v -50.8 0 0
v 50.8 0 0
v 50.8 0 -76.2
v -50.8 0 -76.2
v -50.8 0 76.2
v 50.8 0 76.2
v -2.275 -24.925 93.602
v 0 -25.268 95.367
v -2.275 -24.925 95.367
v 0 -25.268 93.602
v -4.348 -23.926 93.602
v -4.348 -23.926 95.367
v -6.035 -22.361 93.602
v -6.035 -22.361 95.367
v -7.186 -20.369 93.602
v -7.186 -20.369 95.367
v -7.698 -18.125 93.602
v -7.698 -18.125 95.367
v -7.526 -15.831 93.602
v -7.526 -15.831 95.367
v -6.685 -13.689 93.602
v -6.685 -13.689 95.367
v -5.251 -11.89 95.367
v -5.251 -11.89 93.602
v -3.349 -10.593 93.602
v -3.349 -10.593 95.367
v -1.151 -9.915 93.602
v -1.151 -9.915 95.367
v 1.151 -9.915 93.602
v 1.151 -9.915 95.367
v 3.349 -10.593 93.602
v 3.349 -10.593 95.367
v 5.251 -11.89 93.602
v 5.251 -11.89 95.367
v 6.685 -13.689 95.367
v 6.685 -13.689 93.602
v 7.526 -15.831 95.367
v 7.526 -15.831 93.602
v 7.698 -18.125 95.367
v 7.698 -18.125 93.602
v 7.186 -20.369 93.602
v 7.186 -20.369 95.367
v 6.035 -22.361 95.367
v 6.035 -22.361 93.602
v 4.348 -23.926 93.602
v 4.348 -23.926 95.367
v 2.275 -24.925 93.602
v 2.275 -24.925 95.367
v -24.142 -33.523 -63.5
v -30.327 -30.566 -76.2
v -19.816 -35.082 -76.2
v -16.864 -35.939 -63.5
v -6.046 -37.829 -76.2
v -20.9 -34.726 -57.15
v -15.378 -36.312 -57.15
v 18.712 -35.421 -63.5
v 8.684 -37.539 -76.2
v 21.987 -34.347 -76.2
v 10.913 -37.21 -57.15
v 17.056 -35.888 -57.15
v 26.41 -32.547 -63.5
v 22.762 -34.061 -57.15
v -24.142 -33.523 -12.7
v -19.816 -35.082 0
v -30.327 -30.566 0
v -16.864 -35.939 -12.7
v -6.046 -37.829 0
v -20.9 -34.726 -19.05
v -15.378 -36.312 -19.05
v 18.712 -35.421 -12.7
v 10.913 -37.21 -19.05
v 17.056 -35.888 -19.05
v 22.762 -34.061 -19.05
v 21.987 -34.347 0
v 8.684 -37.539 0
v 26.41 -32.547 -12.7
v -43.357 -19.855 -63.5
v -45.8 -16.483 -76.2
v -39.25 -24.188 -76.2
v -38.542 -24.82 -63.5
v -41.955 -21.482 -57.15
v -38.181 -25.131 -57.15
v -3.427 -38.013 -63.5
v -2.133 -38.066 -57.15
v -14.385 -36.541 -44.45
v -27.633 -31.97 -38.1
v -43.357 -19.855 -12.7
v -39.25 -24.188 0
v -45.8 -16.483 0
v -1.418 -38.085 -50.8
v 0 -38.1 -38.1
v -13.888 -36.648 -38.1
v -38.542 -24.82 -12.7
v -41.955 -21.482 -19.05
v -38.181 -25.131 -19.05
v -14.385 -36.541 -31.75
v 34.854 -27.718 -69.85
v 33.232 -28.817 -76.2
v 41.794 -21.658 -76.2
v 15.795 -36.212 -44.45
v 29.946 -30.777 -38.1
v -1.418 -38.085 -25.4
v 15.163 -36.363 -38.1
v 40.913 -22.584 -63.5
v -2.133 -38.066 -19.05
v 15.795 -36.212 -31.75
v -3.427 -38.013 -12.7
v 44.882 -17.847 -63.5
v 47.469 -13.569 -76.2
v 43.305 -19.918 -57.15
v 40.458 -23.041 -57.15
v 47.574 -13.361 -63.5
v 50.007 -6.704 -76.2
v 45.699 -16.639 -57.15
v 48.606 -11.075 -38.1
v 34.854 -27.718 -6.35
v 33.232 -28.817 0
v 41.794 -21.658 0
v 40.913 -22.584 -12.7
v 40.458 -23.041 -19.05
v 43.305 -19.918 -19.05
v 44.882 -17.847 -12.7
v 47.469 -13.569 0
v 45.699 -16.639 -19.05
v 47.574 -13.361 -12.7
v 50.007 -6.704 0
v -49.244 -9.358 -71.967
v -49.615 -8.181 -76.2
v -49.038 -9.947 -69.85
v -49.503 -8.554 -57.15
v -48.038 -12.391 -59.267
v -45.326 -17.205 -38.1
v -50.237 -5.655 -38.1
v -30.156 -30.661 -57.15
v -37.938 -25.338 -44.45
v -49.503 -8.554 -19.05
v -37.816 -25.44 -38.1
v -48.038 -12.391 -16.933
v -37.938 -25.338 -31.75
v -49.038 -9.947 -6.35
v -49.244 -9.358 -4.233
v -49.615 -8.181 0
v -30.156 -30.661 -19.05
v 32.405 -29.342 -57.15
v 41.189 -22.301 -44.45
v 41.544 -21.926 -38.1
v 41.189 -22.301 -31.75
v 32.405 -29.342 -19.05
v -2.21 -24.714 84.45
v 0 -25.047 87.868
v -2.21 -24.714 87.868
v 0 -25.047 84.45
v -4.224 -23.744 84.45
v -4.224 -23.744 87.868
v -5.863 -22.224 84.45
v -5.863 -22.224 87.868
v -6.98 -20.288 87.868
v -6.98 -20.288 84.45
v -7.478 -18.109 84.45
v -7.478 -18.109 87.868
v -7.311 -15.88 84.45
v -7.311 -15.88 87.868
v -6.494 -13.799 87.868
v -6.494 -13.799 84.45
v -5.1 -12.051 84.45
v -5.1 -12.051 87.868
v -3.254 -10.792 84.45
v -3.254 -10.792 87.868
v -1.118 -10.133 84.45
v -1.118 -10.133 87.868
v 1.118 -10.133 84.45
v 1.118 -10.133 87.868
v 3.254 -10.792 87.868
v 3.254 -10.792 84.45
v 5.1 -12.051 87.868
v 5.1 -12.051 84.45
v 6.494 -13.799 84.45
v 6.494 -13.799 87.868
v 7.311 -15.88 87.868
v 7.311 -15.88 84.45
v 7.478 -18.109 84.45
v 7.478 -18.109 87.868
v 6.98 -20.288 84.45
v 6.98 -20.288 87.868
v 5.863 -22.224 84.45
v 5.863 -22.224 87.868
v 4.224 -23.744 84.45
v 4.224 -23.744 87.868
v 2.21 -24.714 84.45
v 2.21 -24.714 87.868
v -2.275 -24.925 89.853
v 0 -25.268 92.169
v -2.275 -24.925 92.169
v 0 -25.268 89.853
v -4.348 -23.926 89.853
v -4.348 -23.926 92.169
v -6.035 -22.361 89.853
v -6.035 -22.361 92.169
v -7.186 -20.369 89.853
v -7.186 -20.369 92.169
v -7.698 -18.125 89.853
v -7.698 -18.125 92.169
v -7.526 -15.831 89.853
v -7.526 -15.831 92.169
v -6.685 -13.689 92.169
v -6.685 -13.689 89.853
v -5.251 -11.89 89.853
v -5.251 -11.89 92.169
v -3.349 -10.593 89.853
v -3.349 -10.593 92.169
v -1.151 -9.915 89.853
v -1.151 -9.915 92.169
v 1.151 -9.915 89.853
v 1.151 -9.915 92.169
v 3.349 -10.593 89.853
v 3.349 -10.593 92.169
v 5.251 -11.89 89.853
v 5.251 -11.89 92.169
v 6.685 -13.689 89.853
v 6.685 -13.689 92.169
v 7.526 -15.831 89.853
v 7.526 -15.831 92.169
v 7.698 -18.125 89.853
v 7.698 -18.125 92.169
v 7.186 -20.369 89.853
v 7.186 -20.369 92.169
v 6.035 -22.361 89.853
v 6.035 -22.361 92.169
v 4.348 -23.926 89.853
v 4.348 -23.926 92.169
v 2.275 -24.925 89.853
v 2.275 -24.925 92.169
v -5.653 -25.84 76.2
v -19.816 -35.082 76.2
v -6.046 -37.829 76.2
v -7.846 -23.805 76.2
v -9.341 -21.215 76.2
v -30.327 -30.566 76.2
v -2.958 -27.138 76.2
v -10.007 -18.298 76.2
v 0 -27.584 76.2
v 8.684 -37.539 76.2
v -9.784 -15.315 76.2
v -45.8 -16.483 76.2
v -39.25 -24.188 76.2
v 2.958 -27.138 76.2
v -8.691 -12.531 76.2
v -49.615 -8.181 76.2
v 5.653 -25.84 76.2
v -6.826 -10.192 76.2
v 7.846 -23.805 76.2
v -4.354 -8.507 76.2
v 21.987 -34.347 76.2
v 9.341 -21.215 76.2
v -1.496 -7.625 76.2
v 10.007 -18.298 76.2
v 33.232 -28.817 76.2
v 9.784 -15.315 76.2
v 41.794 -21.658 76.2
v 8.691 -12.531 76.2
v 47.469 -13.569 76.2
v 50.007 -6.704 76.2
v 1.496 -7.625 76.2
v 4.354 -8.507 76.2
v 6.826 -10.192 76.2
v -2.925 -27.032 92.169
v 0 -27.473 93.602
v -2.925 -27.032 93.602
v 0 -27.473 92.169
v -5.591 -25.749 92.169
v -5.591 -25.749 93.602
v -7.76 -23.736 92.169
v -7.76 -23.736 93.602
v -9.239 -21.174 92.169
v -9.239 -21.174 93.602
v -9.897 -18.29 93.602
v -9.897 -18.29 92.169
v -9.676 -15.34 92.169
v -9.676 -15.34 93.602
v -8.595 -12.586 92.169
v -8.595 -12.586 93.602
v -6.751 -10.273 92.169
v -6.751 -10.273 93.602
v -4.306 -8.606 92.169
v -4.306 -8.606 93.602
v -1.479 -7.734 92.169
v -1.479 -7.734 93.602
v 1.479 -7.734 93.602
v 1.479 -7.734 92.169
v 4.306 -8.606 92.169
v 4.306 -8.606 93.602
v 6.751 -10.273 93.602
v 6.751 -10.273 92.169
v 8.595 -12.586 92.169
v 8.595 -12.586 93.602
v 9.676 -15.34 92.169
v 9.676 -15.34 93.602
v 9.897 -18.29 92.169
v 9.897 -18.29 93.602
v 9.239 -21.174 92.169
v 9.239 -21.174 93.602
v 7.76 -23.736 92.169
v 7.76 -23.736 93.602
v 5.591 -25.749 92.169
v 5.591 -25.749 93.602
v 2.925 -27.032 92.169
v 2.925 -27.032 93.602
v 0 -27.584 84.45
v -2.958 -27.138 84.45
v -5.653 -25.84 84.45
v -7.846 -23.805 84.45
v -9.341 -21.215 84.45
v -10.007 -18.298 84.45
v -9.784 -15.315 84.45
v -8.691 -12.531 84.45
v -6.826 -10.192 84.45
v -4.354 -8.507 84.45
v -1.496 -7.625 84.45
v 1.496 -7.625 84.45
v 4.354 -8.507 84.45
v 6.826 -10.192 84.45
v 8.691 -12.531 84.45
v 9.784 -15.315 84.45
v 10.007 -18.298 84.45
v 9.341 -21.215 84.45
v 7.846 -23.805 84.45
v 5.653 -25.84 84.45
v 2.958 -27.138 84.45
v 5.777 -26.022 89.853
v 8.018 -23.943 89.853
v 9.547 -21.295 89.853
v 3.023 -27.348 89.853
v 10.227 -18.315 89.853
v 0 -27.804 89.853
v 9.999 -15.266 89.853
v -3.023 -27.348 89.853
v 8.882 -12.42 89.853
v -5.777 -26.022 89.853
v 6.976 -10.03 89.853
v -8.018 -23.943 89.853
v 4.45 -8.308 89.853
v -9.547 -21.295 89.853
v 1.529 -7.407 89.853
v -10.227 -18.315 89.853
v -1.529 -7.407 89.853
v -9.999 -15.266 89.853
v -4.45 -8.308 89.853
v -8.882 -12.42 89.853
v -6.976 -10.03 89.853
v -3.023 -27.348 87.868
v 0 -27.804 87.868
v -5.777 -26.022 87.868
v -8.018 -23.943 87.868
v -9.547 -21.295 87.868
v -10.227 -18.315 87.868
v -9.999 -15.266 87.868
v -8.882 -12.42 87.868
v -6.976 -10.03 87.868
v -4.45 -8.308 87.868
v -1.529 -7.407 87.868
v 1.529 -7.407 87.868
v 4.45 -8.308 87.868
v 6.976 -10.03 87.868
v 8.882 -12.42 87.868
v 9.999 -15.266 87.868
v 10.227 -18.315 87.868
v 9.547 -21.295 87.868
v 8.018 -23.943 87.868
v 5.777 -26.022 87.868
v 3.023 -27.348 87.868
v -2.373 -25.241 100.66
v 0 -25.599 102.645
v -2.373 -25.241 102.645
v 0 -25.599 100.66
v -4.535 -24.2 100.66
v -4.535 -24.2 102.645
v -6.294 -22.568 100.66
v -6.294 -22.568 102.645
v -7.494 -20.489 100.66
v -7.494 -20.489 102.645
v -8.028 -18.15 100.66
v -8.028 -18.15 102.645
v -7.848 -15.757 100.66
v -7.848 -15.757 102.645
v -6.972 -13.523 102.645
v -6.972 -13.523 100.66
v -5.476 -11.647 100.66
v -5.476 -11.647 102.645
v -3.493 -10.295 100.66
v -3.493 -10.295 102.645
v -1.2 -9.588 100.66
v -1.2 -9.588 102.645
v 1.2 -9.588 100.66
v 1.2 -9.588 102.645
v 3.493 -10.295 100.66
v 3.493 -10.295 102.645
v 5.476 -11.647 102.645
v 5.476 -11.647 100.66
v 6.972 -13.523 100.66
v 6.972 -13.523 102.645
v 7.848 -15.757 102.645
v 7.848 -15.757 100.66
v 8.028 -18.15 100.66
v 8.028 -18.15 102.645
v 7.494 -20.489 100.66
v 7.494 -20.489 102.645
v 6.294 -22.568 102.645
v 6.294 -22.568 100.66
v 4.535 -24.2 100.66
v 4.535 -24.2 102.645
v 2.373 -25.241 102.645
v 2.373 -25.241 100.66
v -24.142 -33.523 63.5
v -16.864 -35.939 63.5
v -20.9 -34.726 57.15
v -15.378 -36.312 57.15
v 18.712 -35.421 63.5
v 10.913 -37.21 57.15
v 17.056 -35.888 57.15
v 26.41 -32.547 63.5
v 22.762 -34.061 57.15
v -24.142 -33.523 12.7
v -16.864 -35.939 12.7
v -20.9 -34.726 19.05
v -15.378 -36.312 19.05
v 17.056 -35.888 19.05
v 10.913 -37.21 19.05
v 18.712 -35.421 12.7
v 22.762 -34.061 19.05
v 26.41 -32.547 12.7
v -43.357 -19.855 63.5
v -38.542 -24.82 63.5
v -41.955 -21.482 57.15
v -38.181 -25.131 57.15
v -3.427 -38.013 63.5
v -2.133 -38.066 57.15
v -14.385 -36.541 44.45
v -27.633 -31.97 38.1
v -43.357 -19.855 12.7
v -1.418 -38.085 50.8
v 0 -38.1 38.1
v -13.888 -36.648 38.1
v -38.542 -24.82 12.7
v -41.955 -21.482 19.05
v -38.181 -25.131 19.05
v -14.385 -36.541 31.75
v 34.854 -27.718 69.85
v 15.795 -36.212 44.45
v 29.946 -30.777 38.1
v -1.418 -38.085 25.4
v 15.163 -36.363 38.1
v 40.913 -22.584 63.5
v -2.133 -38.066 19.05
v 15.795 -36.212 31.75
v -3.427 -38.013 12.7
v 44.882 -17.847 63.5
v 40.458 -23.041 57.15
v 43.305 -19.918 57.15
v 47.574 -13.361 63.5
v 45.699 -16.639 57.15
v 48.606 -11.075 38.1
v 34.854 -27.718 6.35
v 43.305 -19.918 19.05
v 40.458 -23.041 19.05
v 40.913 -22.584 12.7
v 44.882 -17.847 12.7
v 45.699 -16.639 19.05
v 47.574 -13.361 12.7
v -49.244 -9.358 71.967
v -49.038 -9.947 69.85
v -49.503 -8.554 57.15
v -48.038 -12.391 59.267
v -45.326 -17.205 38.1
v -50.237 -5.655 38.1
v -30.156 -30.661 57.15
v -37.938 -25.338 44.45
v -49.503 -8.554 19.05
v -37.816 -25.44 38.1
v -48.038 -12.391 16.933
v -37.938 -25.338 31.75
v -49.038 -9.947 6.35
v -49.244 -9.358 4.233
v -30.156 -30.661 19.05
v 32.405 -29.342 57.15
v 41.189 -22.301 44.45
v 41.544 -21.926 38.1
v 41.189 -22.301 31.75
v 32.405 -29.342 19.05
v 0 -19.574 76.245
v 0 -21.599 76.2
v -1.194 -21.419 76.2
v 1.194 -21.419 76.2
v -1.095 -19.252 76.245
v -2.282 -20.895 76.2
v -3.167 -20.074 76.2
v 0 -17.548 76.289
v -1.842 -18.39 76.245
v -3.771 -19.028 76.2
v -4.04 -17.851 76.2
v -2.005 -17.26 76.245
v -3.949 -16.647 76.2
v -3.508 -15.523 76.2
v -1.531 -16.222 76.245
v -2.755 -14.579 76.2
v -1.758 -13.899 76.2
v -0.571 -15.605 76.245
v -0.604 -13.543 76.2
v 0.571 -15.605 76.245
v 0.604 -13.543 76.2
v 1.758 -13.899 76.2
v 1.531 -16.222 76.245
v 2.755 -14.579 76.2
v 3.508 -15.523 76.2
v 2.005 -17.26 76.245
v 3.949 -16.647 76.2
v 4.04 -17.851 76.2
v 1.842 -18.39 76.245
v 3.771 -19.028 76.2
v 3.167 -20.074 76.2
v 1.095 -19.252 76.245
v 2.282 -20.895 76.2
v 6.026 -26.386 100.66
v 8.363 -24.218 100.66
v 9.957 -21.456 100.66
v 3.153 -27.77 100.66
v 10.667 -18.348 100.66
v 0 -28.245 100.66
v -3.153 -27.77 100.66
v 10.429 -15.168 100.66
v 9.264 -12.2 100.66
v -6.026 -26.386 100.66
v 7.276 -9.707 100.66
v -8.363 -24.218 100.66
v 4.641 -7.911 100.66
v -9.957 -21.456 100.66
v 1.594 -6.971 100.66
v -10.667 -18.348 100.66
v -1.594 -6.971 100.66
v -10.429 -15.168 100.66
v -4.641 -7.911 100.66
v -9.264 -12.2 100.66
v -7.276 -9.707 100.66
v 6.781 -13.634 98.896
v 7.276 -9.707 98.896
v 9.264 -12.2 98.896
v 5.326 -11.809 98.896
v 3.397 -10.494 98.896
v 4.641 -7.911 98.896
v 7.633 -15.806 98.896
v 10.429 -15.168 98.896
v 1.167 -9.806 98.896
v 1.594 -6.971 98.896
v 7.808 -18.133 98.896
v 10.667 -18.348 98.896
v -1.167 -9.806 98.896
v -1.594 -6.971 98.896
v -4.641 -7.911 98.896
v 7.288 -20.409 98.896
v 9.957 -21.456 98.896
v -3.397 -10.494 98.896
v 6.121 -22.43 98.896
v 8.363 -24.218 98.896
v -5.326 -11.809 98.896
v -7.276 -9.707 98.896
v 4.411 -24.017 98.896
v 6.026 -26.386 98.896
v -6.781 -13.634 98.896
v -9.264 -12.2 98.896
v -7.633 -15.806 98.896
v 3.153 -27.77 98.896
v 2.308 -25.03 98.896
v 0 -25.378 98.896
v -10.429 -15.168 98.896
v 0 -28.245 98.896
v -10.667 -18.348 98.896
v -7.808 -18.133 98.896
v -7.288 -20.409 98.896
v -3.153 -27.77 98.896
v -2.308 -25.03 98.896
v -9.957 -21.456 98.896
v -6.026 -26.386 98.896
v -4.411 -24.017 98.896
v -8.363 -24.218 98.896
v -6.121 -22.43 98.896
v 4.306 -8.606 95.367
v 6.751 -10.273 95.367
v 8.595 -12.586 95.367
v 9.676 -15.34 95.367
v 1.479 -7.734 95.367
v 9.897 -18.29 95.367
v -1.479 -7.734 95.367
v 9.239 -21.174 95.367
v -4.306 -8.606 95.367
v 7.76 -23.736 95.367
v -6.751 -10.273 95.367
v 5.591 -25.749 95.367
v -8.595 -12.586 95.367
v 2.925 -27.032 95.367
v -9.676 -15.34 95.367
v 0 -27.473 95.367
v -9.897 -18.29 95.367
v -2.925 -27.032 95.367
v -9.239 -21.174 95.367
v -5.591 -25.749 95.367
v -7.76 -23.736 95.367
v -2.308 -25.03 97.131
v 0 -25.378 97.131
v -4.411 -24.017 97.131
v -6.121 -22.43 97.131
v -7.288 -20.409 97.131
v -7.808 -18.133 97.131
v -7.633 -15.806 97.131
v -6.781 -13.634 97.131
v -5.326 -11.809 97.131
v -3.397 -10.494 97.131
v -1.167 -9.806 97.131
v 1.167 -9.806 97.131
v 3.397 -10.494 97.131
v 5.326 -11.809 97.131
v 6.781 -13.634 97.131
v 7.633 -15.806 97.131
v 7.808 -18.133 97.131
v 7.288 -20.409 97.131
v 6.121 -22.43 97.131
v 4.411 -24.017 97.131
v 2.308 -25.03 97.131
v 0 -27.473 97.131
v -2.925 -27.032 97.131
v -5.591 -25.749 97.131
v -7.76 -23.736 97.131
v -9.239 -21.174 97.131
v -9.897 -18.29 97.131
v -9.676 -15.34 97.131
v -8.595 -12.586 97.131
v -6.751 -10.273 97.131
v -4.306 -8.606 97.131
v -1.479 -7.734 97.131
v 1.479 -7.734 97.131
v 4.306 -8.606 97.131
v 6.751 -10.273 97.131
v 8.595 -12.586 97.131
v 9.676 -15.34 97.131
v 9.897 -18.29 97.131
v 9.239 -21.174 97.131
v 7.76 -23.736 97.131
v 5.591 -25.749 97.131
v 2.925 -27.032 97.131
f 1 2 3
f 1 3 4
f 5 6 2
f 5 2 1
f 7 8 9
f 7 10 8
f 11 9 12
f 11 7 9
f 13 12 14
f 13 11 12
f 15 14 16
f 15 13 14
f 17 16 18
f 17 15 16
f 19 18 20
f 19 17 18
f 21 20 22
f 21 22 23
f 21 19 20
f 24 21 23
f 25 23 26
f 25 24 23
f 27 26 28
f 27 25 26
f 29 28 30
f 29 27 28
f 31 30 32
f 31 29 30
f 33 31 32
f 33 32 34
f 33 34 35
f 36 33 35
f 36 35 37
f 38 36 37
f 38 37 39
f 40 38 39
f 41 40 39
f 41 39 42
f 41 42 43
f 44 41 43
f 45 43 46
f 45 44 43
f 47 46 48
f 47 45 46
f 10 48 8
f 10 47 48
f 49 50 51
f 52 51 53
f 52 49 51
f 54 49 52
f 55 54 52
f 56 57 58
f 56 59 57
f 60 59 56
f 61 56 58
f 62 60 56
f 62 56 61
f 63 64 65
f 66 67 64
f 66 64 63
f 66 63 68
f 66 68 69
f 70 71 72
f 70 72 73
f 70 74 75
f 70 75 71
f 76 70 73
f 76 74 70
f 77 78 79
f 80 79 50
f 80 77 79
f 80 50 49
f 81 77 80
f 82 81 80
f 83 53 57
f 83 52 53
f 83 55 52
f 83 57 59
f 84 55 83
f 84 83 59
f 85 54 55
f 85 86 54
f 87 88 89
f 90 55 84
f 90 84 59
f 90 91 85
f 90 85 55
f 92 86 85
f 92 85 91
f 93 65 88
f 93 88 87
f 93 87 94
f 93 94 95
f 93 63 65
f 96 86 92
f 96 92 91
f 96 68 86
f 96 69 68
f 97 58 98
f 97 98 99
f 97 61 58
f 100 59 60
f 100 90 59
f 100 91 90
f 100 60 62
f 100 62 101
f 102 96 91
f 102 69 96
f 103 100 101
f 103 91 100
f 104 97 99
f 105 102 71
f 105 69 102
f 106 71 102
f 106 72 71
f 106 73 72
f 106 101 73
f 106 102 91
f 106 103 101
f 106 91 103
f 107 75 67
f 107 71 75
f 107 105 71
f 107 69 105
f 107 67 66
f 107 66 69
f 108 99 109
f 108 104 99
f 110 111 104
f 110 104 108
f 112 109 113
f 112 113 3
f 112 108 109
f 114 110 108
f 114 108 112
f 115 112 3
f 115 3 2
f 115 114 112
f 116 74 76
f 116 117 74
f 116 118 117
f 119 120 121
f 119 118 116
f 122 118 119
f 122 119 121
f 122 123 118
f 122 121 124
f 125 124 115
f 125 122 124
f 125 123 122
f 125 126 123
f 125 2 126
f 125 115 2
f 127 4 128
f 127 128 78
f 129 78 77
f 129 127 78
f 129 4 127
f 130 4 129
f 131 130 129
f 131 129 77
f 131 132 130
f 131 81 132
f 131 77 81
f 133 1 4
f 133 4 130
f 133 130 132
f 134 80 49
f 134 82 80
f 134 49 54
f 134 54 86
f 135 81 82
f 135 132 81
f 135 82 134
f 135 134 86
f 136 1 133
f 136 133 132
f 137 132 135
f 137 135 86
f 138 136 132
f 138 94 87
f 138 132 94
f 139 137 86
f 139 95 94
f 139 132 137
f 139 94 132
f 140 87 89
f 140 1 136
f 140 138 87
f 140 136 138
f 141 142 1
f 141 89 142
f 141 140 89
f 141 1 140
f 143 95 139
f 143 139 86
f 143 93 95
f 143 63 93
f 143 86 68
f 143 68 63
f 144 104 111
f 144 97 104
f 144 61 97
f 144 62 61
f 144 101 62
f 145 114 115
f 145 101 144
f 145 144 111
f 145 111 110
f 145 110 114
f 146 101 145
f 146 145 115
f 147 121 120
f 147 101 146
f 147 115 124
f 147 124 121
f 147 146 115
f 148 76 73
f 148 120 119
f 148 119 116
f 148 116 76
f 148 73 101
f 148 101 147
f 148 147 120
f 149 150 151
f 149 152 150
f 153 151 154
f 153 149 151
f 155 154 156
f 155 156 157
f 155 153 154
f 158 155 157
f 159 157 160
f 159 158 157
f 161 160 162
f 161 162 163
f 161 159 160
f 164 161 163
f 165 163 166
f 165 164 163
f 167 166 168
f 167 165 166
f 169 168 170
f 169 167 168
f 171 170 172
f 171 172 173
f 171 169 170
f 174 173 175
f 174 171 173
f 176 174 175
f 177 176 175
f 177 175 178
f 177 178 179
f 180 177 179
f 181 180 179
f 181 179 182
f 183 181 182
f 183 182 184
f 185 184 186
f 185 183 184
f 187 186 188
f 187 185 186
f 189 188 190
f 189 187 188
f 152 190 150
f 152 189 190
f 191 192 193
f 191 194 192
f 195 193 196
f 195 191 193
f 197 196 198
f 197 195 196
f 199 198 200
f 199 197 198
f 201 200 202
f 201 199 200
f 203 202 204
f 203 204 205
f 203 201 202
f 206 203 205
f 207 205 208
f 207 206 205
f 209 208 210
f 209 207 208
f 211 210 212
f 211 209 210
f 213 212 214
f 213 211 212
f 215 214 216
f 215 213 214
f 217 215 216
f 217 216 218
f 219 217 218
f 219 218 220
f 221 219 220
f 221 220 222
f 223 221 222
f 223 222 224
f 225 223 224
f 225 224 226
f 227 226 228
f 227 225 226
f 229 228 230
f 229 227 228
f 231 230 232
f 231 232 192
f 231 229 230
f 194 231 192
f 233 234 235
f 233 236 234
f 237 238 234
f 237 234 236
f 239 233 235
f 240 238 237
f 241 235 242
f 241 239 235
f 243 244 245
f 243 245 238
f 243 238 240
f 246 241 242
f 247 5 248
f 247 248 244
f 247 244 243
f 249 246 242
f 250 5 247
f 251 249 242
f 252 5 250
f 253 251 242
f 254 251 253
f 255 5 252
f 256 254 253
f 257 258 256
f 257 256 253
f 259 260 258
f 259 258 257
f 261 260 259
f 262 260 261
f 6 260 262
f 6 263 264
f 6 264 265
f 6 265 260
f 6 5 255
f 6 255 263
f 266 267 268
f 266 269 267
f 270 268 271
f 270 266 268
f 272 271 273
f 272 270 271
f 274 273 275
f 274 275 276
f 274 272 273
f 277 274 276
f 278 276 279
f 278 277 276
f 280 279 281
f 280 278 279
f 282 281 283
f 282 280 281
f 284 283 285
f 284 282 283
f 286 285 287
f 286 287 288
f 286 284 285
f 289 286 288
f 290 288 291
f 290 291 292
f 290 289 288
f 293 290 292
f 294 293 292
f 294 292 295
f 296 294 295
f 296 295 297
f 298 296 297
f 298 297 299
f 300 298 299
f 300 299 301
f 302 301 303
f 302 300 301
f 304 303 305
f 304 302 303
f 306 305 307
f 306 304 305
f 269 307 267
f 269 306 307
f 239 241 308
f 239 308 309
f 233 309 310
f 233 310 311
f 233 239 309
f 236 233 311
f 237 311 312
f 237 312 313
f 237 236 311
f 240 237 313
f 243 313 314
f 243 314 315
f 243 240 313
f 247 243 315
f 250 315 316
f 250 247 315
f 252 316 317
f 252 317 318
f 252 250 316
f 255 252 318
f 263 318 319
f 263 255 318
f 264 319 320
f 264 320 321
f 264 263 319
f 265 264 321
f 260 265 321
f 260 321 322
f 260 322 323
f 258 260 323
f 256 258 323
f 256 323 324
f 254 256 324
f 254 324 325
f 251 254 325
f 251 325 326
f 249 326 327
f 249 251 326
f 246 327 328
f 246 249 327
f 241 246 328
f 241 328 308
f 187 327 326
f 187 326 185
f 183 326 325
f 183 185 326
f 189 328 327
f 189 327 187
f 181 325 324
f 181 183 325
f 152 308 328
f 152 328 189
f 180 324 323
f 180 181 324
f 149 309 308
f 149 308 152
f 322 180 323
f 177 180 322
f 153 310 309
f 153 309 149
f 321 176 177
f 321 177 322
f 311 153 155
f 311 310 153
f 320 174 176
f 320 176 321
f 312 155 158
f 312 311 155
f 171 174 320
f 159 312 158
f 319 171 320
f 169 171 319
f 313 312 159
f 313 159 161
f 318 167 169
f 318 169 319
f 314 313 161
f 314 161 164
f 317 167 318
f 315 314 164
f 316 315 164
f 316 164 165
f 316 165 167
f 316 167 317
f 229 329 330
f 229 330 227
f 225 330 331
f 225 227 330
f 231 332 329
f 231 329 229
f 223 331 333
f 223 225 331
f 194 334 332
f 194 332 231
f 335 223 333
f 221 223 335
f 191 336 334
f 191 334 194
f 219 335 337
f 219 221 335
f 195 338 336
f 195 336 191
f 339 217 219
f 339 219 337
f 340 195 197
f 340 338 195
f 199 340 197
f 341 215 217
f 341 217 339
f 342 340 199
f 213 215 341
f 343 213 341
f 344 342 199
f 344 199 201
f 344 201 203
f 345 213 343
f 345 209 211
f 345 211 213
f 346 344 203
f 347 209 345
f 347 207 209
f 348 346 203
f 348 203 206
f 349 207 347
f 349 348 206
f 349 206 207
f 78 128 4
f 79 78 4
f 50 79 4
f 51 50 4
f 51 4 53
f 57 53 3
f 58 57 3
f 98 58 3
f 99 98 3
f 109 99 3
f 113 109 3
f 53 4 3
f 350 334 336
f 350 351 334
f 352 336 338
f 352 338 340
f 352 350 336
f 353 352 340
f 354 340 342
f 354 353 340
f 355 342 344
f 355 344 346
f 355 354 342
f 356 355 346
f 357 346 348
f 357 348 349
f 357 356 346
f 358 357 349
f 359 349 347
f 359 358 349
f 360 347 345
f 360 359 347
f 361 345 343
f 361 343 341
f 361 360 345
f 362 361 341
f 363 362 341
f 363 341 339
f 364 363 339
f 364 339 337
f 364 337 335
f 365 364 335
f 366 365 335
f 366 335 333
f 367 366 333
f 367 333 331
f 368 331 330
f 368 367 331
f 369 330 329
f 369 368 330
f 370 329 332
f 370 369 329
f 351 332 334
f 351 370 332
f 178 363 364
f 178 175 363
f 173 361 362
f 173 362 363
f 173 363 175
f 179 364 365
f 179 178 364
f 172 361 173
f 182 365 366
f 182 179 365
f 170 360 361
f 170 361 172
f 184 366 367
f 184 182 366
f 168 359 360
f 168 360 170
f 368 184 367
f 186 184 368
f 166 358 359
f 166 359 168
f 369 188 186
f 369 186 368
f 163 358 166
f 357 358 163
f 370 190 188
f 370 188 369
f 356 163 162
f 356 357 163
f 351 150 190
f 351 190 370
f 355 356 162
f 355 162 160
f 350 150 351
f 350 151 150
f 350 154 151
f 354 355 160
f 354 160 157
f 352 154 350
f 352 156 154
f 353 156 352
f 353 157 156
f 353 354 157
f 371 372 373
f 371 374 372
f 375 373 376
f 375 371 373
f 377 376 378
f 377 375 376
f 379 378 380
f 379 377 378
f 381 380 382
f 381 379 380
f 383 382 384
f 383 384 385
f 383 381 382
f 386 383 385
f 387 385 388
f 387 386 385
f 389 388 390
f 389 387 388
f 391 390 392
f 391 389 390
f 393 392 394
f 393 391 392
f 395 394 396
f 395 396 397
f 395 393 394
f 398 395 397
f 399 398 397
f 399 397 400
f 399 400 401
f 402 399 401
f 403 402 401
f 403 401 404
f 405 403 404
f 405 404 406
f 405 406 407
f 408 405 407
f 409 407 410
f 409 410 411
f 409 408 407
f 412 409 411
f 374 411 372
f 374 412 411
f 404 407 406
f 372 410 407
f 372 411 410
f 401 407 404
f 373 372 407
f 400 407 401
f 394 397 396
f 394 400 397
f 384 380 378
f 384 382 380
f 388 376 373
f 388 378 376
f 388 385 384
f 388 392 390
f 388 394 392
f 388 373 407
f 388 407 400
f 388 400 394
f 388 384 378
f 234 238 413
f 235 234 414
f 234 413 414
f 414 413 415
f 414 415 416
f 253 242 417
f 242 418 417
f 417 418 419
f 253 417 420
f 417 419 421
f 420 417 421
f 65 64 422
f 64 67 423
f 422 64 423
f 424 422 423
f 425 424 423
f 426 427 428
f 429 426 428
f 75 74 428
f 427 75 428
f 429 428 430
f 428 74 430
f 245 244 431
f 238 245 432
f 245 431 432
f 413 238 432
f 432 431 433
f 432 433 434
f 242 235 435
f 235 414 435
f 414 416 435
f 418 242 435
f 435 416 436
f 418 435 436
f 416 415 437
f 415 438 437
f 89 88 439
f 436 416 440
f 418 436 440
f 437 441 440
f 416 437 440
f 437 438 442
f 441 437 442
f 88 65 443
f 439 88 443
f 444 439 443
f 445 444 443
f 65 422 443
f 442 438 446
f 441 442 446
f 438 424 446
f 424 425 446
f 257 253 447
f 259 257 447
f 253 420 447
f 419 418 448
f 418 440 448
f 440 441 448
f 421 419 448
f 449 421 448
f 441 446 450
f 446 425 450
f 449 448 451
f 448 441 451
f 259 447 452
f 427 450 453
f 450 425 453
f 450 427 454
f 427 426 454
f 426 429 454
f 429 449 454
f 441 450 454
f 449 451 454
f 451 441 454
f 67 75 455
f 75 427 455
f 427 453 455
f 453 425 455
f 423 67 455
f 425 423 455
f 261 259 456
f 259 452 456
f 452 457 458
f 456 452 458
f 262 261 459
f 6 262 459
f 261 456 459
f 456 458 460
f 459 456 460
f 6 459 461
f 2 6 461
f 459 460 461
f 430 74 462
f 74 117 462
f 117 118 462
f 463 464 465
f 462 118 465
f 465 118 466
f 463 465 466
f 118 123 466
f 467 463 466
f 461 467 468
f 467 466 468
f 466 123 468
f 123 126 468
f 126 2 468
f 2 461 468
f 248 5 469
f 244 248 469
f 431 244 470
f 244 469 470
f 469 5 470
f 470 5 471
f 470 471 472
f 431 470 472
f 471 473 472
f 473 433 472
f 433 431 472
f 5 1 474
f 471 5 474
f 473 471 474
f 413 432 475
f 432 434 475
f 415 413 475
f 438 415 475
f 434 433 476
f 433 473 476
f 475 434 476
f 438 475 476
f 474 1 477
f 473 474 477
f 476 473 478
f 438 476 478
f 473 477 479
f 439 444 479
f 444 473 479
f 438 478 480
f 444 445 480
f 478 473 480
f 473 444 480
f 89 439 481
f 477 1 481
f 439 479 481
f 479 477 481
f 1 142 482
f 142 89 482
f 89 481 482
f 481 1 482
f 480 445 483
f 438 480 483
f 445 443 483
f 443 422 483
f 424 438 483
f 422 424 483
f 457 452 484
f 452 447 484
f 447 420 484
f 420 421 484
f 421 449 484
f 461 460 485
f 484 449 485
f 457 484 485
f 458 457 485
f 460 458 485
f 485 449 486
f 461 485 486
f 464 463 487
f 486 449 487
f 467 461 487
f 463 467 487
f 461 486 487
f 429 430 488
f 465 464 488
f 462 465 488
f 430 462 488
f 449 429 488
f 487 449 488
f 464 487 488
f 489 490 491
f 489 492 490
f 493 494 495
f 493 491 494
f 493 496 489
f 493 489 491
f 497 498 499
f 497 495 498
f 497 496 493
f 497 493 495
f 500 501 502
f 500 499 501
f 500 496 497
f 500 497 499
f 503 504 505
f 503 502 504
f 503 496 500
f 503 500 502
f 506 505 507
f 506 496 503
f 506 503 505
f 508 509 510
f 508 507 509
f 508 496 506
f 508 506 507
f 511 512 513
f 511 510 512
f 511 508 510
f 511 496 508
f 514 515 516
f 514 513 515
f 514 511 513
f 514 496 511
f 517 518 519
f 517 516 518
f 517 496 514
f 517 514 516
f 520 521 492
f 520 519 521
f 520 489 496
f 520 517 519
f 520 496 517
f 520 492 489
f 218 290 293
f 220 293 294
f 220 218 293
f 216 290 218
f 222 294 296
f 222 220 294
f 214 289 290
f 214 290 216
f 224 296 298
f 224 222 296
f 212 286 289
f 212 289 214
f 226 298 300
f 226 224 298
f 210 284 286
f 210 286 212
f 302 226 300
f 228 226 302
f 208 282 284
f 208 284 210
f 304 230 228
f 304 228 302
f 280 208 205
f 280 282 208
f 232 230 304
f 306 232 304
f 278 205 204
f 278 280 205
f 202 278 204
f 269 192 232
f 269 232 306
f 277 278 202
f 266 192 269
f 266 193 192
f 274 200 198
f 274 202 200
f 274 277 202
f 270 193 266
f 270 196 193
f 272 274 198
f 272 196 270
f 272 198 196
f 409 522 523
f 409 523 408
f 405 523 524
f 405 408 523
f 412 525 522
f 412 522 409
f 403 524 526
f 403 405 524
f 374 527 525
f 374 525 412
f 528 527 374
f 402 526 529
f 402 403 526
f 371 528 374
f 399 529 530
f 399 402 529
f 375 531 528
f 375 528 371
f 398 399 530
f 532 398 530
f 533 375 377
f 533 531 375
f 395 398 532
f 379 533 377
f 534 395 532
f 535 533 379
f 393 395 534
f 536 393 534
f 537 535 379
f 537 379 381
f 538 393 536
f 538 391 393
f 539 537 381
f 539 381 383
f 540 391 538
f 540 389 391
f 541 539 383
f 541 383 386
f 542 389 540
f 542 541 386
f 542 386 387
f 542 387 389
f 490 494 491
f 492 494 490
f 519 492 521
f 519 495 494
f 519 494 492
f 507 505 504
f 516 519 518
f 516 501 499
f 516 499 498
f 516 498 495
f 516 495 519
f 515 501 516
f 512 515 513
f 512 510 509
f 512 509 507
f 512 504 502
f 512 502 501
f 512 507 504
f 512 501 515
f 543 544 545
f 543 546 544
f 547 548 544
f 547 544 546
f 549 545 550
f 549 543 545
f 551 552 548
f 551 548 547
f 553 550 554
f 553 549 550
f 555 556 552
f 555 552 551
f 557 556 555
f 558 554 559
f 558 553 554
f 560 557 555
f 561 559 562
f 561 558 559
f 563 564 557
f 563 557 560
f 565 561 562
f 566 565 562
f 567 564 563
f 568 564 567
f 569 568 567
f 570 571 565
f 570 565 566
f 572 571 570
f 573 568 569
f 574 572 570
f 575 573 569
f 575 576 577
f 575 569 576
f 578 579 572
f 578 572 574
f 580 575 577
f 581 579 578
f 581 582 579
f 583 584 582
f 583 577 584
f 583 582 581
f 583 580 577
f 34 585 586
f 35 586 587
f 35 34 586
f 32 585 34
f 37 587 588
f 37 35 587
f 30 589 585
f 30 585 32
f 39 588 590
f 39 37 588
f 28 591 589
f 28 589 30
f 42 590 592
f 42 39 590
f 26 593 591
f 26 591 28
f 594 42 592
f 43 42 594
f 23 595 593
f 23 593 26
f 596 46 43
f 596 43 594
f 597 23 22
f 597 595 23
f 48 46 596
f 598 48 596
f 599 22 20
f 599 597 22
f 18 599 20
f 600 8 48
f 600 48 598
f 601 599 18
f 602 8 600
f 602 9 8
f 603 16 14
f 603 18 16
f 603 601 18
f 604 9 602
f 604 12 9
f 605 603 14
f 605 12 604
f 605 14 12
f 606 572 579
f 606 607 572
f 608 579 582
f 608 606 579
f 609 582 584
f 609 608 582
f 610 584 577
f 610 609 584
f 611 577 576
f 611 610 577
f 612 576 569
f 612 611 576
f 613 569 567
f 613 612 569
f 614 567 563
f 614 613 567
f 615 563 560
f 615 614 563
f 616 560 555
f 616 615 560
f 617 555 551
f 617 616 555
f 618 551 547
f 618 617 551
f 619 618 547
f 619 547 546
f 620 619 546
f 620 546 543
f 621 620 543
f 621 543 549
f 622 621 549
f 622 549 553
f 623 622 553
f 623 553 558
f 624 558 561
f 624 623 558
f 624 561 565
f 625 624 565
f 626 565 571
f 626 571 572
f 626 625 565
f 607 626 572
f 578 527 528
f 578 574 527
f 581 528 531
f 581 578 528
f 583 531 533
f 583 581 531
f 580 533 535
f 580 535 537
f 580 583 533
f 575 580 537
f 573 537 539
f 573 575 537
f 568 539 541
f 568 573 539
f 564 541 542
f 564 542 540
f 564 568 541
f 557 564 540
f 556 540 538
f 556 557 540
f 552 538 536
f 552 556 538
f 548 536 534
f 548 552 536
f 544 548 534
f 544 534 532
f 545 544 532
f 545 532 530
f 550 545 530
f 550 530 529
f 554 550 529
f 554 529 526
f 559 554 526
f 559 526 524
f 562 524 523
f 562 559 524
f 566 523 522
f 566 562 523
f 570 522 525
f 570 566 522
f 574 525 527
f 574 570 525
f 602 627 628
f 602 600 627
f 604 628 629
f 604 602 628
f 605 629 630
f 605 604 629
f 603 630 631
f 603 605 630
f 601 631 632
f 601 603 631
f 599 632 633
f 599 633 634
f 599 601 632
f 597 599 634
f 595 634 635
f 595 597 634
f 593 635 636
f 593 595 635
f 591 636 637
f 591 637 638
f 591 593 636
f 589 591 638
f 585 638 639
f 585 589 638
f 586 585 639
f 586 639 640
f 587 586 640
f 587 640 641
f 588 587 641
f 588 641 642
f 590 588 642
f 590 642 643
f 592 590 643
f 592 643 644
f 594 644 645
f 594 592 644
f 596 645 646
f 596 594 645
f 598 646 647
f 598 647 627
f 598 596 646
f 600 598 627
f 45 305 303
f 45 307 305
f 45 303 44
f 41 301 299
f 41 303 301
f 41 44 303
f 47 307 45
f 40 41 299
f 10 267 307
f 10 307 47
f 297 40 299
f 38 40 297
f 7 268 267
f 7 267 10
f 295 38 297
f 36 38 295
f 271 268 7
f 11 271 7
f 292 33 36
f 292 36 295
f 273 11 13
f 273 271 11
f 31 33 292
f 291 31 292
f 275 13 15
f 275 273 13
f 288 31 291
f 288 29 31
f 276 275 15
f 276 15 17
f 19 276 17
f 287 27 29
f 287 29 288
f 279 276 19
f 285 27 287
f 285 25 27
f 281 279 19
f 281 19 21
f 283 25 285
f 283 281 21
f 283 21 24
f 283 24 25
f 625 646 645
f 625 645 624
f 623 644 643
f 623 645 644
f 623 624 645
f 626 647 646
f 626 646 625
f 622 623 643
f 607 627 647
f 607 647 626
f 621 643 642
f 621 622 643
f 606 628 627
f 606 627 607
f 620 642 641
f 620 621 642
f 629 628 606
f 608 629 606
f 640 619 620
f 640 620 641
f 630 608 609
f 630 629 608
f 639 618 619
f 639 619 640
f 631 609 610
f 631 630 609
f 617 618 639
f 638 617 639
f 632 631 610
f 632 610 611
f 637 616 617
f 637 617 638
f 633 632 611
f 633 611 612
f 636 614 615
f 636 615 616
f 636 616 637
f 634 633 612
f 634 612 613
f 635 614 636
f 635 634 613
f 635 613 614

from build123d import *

# Parameters (mm, degrees)
F1_DEPTH      = 76.2
F1_DEPTH_BACK = 76.2


# Not quite as in the source:
# - a feature of the source that left no trace in its solid (it failed there, or was rolled back) is left out


with BuildPart() as f1:
    # F0 (on Top) → F1 (new body, two sides)
    with BuildSketch(Plane.XY) as f1_sk:
        with BuildLine():
            Line((50.8, 0), (-50.8, 0))
            add(Edge.make_bspline(
                [(-50.8, 0), (-50.8, -38.1), (0, -38.1), (50.8, -38.1), (50.8, 0)],
                knots=[0, 0, 0, 1.5707963268, 1.5707963268, 3.1415926536, 3.1415926536, 3.1415926536], degree=2, weights=[1, 0.7071067812, 1, 0.7071067812, 1]))
        make_face()
    extrude(amount=F1_DEPTH)
    extrude(f1_sk.sketch, amount=-F1_DEPTH_BACK)

    # F2 (on Right) → F3 (revolve)
    with BuildSketch(Plane.YZ):
        Polygon((-27.5835152715, 76.0684758425), (-17.5483282655, 76.2890353799), (-17.5483282655, 102.6451811194), (-25.5985315889, 102.6451811194), (-25.5985315889, 100.6601974368), (-28.2451752573, 100.6601974368), (-28.2451752573, 98.8957732916), (-25.3779776394, 98.8957732916), (-25.3779776394, 97.1313416958), (-27.4732373655, 97.1313416958), (-27.4732373655, 95.3669101), (-25.267701596, 95.3669101), (-25.267701596, 93.6024859548), (-27.4732373655, 93.6024859548), (-27.4732373655, 92.1688899398), (-25.267701596, 92.1688899398), (-25.267701596, 89.8530781269), (-27.8040673584, 89.8530781269), (-27.8040673584, 87.8680944443), (-25.0471476465, 87.8680944443), (-25.0471476465, 84.4495147467), (-27.5835152715, 84.4495147467), align=None)
    revolve(axis=Axis((0, -17.5483282655, 90.2941823006), (0, 0, -1)))


solid = f1.part
